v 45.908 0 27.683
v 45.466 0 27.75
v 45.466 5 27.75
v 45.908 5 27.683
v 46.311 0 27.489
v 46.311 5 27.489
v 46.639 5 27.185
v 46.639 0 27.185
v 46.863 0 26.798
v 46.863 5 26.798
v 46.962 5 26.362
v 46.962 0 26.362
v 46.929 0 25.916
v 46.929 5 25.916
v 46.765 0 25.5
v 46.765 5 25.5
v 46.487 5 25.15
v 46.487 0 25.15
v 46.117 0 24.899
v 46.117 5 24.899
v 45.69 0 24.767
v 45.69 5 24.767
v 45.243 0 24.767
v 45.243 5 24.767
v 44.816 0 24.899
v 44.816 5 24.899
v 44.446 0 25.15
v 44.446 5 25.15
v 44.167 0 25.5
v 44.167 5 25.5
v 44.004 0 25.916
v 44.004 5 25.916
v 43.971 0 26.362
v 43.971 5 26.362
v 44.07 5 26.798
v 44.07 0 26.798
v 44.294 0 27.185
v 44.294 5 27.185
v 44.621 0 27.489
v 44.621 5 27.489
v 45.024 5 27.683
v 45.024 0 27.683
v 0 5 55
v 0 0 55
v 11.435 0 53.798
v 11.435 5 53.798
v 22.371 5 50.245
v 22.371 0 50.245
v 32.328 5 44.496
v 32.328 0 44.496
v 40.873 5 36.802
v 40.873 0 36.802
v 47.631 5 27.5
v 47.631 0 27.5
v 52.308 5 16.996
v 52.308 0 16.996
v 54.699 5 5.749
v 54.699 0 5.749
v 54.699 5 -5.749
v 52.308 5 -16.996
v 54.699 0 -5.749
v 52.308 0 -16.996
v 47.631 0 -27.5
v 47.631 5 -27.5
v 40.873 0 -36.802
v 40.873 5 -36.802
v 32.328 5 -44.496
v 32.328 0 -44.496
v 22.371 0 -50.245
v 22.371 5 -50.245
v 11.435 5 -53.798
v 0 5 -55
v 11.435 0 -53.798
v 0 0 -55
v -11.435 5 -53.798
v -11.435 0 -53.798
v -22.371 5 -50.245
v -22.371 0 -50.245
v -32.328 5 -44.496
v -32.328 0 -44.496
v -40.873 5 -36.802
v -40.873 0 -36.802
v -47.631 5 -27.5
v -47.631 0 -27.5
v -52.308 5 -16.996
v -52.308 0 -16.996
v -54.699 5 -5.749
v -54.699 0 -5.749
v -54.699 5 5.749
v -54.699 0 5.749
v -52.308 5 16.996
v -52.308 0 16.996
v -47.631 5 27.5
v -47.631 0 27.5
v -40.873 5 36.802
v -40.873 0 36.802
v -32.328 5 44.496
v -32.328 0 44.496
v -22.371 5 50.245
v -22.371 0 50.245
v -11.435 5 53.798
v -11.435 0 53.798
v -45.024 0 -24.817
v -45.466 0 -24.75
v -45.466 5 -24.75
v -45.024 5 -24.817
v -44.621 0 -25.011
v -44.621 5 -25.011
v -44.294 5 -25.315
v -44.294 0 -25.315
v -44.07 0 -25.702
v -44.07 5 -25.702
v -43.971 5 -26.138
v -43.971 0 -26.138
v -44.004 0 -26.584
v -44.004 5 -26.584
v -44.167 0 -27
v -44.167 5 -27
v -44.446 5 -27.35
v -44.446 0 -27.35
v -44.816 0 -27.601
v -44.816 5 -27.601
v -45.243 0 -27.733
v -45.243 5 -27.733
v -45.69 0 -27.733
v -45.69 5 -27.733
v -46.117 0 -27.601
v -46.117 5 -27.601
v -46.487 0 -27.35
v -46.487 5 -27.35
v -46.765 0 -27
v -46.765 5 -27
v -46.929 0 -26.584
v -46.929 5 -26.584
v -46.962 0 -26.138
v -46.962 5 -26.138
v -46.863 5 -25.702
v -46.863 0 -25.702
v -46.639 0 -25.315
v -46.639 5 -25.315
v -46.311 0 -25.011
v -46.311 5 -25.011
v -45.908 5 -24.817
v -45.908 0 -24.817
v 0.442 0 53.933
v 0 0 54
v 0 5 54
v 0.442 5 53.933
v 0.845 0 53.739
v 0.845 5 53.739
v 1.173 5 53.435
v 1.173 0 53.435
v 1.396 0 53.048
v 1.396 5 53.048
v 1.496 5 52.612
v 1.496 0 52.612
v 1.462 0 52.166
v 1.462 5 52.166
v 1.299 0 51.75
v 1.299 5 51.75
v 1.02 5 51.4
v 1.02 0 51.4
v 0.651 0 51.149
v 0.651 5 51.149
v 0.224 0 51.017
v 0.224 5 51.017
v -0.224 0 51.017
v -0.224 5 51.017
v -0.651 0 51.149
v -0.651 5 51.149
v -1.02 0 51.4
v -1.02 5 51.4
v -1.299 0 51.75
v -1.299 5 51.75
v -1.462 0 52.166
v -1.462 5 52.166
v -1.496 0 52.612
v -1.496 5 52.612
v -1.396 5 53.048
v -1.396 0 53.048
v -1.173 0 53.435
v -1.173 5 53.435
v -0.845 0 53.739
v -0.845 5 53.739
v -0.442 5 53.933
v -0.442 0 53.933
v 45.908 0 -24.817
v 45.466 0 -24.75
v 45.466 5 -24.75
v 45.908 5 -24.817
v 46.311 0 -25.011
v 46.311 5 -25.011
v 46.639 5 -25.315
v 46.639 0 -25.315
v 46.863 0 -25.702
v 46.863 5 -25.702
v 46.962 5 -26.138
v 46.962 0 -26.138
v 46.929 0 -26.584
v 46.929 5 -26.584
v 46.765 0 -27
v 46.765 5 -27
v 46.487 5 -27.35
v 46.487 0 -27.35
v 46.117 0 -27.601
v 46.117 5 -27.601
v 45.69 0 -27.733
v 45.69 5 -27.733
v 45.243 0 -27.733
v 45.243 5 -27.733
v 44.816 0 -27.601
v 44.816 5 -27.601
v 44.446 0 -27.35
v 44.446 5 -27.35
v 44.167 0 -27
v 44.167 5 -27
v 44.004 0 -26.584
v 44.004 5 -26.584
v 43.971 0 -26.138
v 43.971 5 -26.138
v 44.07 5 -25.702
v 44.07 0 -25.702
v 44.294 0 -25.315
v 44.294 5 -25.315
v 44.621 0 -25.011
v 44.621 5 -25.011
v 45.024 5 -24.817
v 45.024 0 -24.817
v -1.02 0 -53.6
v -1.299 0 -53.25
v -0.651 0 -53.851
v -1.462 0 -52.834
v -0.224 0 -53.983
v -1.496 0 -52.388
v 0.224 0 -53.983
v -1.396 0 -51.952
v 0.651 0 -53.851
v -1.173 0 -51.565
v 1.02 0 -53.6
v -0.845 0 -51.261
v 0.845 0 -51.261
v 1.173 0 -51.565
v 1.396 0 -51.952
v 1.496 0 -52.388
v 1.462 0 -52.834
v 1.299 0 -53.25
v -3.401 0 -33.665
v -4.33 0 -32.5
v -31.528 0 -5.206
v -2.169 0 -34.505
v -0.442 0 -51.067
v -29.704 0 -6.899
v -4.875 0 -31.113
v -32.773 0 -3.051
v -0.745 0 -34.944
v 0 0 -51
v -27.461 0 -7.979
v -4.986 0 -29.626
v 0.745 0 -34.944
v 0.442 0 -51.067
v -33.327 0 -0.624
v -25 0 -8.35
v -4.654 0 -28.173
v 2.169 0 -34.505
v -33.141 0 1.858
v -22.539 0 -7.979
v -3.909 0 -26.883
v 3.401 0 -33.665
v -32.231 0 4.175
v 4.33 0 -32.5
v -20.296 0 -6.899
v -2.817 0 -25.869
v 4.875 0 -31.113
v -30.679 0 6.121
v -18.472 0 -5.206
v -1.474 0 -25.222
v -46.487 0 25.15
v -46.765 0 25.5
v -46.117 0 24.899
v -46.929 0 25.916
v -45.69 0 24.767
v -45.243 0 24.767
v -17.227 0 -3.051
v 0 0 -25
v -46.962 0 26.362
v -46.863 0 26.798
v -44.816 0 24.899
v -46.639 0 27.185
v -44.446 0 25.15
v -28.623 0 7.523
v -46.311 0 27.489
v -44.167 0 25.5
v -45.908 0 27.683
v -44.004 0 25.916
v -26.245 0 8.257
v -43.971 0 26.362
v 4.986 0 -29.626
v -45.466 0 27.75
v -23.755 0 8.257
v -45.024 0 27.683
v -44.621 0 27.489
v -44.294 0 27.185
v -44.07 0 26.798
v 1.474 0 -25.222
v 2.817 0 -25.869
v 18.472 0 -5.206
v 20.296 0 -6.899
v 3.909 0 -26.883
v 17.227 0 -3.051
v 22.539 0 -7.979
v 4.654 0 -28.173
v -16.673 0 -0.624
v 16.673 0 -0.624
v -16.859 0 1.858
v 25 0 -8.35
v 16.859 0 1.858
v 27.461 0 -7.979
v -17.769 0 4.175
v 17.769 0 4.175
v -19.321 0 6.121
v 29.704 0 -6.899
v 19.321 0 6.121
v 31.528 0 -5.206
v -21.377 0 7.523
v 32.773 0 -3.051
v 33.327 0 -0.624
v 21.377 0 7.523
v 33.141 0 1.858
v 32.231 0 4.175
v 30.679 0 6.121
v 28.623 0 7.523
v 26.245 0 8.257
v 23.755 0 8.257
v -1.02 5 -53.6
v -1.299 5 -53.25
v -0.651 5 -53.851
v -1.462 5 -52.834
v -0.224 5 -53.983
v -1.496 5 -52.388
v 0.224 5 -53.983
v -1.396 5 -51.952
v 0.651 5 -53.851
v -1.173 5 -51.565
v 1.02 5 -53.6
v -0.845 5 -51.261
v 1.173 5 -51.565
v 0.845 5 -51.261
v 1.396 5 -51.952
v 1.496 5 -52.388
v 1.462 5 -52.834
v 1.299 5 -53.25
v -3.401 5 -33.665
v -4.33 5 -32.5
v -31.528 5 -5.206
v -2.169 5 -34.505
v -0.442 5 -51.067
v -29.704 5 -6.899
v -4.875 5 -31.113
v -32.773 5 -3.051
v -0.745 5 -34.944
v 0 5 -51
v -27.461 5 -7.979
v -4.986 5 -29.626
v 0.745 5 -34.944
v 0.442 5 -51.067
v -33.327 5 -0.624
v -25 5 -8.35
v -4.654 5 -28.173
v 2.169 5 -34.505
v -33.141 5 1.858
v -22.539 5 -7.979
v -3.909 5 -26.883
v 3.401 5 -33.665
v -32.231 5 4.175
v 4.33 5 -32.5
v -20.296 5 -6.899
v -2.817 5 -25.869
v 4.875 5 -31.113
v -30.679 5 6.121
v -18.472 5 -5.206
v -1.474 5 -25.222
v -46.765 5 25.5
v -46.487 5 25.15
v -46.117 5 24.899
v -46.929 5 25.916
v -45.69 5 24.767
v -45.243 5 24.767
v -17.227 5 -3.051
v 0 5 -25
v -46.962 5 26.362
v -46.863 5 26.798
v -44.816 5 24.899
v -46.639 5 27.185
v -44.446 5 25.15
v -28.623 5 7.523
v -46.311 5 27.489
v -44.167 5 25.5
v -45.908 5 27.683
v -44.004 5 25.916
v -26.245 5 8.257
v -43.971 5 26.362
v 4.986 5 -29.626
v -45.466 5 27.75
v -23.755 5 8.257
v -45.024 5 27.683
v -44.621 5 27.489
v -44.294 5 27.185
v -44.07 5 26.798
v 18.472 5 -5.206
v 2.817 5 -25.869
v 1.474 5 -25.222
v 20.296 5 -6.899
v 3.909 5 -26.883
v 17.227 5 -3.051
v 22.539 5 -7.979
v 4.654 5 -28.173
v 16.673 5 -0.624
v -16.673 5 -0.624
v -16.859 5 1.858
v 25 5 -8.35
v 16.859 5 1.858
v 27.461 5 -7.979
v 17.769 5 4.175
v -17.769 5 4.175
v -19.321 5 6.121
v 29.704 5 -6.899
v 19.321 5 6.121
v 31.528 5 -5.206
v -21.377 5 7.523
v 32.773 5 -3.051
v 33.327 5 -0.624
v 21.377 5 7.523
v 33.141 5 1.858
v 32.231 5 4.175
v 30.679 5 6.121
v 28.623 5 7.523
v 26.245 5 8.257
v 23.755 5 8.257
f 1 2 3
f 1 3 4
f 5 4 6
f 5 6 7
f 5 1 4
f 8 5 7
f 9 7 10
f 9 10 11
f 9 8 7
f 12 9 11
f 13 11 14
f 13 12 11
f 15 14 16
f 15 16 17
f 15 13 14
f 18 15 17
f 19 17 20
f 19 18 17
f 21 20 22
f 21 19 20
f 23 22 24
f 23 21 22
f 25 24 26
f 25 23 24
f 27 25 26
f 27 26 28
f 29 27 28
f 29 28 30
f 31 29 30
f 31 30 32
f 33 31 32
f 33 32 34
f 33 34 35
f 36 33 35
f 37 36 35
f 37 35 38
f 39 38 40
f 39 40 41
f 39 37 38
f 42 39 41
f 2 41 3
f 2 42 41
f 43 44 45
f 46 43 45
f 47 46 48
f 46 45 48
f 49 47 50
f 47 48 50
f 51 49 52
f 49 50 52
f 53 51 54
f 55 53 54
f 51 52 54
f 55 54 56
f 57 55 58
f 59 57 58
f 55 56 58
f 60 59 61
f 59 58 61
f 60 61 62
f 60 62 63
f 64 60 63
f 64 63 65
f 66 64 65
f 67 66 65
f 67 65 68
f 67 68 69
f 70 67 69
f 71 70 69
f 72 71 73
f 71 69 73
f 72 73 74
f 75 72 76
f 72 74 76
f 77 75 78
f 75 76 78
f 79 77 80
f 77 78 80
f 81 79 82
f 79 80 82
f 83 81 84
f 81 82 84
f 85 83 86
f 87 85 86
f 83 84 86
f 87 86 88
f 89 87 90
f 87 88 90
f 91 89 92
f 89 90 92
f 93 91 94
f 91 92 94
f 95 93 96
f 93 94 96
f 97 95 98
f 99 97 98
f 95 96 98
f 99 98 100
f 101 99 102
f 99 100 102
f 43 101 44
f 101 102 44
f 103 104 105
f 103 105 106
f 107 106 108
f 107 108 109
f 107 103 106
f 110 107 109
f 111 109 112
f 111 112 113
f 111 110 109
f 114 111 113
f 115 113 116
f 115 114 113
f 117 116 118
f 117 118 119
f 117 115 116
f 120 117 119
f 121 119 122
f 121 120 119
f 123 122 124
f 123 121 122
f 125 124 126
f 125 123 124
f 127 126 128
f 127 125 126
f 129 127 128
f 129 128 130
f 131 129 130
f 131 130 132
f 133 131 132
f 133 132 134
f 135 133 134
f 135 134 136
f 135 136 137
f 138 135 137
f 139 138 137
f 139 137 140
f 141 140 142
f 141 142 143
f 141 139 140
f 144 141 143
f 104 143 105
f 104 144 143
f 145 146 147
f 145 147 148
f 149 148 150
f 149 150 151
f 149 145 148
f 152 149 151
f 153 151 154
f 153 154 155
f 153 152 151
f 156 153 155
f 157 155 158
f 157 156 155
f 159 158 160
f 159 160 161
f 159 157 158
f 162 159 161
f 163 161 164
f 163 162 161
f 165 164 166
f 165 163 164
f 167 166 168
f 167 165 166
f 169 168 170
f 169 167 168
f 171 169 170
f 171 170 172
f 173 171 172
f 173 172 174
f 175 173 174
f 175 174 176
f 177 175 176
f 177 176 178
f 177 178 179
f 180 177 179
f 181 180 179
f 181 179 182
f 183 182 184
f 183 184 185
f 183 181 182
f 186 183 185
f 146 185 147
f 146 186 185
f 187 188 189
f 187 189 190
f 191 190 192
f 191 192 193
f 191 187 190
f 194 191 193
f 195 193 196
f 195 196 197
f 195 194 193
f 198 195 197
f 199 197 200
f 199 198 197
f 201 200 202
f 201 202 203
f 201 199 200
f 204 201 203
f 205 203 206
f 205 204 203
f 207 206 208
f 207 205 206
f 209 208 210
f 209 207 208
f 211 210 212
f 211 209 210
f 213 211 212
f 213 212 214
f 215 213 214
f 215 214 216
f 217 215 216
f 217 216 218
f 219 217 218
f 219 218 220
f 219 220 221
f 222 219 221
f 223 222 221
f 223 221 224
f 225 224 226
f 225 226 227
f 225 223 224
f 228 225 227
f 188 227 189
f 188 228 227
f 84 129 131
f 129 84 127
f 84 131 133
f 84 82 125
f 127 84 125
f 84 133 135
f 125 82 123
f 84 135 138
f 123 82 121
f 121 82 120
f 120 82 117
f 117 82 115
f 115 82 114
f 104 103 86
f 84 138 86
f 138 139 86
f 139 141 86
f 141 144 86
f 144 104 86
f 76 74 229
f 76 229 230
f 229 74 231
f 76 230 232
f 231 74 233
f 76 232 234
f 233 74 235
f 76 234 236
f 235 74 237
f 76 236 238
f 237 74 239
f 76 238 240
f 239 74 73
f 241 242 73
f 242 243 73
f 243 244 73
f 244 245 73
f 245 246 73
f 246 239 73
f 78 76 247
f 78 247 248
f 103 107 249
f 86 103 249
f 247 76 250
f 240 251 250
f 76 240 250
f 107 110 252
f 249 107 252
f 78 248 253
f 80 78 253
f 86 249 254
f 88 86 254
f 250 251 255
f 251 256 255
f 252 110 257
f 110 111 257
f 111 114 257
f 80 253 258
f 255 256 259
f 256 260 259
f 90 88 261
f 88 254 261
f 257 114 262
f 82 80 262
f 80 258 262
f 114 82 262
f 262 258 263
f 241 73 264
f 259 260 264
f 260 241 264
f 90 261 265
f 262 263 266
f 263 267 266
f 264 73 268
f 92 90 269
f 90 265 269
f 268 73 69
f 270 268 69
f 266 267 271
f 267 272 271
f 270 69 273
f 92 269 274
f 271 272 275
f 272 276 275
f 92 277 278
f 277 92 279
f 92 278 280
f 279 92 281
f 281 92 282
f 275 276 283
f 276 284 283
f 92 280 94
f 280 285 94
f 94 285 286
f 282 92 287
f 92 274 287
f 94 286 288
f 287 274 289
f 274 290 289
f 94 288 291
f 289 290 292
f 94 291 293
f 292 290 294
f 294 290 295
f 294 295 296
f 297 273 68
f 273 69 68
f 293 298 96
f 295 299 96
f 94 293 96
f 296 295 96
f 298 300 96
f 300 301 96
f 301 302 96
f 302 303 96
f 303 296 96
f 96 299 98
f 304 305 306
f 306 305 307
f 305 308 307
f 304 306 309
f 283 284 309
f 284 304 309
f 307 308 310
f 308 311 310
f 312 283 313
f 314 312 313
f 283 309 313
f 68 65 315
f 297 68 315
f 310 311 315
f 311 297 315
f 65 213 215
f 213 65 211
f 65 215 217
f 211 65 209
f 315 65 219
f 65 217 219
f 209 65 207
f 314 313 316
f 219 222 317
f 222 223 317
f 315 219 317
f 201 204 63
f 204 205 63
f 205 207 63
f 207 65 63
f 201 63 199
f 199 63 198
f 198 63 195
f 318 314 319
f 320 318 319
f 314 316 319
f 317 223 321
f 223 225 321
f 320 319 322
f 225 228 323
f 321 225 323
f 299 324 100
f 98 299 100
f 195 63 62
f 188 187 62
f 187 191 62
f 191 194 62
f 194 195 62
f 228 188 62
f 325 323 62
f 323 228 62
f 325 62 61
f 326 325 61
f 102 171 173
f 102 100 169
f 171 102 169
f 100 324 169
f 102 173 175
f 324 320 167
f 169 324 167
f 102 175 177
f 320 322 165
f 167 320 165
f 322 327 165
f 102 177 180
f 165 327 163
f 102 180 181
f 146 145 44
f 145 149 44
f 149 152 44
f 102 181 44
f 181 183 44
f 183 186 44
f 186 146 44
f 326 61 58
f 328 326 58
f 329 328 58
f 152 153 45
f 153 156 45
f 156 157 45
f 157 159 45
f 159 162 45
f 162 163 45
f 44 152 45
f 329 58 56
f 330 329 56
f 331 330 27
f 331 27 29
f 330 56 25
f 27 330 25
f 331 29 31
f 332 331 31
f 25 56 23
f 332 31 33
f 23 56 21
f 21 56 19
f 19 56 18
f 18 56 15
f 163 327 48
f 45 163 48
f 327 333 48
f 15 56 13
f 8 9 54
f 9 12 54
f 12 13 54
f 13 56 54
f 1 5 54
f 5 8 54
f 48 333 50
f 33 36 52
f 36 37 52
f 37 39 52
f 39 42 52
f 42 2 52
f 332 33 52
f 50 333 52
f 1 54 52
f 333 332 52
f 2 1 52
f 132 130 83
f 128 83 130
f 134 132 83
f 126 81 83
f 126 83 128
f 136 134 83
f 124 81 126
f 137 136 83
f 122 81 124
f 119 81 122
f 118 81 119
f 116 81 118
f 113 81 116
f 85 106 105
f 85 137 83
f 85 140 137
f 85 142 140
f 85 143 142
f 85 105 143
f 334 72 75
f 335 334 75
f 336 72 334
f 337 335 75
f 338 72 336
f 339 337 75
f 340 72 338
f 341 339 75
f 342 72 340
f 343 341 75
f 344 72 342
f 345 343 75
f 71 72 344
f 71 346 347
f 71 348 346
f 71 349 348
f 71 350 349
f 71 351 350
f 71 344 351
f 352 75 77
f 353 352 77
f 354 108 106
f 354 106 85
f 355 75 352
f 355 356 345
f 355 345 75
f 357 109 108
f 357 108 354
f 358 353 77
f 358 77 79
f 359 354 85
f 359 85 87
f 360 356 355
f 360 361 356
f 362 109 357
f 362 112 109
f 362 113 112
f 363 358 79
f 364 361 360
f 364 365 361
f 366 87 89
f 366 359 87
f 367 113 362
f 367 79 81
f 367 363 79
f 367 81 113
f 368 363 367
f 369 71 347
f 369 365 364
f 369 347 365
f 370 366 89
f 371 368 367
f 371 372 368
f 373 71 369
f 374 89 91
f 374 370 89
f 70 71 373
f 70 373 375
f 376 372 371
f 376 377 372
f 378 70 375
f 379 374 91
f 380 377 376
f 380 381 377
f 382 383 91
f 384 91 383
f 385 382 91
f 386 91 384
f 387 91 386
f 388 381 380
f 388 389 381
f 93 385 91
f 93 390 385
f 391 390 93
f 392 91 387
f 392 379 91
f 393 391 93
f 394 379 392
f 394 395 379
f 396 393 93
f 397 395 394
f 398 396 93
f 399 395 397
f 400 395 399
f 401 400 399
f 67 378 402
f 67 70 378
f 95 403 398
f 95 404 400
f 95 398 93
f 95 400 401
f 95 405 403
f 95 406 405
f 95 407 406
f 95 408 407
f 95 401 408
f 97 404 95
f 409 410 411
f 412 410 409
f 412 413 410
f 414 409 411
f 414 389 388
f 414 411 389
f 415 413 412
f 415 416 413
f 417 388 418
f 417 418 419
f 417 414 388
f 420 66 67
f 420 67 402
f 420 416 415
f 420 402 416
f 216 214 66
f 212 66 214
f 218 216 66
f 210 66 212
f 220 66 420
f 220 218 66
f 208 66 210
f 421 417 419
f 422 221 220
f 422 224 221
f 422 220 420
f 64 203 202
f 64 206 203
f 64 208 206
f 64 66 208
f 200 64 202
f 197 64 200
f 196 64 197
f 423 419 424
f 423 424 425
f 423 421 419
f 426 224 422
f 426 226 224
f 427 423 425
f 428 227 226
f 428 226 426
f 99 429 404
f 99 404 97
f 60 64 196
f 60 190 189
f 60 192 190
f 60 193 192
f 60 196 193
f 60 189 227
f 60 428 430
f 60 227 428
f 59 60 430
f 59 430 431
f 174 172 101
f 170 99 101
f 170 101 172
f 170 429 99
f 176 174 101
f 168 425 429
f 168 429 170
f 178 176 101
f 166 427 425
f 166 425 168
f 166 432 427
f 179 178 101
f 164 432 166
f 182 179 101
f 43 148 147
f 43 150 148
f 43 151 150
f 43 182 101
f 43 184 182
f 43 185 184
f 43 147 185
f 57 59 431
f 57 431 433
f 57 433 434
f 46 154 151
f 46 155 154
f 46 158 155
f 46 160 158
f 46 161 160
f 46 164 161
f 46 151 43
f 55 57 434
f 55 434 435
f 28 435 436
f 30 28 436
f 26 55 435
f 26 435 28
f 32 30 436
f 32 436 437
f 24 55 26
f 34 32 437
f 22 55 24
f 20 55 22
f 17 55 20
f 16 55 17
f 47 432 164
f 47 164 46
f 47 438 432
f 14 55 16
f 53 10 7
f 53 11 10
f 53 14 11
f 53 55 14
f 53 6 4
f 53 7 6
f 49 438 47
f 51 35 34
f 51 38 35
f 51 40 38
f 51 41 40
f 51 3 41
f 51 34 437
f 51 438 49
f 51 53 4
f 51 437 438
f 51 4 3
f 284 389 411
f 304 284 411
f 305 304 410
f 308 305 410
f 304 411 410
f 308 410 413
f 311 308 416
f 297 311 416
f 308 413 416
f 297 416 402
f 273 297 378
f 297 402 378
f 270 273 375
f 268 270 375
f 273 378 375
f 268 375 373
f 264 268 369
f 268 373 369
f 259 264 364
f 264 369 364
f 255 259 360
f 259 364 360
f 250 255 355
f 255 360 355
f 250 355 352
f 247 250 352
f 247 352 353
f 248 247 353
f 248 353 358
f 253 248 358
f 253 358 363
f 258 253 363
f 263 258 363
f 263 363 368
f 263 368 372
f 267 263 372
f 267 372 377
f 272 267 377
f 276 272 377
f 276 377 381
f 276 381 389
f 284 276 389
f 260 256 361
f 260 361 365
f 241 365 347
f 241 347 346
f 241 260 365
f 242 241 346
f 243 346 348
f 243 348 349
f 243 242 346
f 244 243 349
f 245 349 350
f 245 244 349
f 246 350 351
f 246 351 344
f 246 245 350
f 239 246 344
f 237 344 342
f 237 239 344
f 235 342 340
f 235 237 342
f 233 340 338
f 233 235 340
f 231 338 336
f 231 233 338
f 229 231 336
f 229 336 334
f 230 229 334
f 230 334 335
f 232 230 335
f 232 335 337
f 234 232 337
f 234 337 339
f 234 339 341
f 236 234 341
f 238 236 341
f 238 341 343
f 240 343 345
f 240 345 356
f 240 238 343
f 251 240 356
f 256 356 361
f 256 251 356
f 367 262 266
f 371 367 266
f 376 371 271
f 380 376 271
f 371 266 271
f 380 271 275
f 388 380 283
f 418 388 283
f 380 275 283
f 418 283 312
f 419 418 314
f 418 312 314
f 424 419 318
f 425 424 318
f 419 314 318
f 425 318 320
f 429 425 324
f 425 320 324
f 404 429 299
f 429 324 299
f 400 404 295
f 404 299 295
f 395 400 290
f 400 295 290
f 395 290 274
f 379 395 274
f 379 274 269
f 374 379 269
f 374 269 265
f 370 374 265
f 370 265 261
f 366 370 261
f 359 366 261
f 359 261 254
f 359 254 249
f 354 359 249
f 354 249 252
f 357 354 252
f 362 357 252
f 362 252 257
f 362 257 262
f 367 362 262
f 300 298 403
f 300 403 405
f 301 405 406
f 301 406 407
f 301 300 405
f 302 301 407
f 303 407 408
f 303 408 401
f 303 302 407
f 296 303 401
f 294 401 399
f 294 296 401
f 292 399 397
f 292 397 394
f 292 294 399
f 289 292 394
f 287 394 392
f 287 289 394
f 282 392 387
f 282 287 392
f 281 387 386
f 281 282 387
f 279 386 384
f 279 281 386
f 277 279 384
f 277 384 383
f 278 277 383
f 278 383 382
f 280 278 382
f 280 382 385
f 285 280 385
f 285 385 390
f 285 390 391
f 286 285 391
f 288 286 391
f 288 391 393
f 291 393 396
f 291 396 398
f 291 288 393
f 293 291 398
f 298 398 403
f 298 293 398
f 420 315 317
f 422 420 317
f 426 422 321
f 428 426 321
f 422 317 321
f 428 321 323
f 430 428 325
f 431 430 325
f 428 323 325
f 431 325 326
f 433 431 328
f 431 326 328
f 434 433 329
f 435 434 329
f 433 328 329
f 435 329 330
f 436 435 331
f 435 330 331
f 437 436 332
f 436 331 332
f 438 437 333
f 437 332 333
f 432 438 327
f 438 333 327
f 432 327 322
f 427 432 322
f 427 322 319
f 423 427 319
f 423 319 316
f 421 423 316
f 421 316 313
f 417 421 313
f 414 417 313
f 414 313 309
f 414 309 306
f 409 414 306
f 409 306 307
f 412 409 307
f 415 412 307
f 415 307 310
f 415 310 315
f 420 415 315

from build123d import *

# Parameters (mm, degrees)
SKETCH_1_R          = 55
SKETCH_1_R_2        = 1.5
EXTRUDE_1_DEPTH     = 5
SKETCH_4_R          = 5
CUT_EXTRUDE_1_DEPTH = 10
SKETCH_5_R          = 8.35
CUT_EXTRUDE_2_DEPTH = 78.942286341


with BuildPart() as part:
    # 草图1 → 凸台-拉伸1 (new body)
    with BuildSketch(Plane(origin=(0, 0, 0), x_dir=(1, 0, 0), z_dir=(0, 1, 0))):
        with Locations(Location((0, 0, 0), (0, 0, 270))):
            Circle(SKETCH_1_R)
        with Locations(Location((0, 52.5, 0), (0, 0, 270))):
            Circle(SKETCH_1_R_2, mode=Mode.SUBTRACT)
        with Locations(Location((45.466333699, 26.25, 0), (0, 0, 270))):
            Circle(SKETCH_1_R_2, mode=Mode.SUBTRACT)
        with Locations(Location((45.466333699, -26.25, 0), (0, 0, 270))):
            Circle(SKETCH_1_R_2, mode=Mode.SUBTRACT)
        with Locations(Location((0, -52.5, 0), (0, 0, 270))):
            Circle(SKETCH_1_R_2, mode=Mode.SUBTRACT)
        with Locations(Location((-45.466333699, -26.25, 0), (0, 0, 270))):
            Circle(SKETCH_1_R_2, mode=Mode.SUBTRACT)
        with Locations(Location((-45.466333699, 26.25, 0), (0, 0, 270))):
            Circle(SKETCH_1_R_2, mode=Mode.SUBTRACT)
    extrude(amount=EXTRUDE_1_DEPTH)

    # 草图4 → 切除-拉伸1 (cut)
    with BuildSketch(Plane(origin=(0, 5, 0), x_dir=(1, 0, 0), z_dir=(0, 1, 0))):
        with Locations(Location((0, 30, 0), (0, 0, 270))):
            Circle(SKETCH_4_R)
    extrude(amount=-CUT_EXTRUDE_1_DEPTH, mode=Mode.SUBTRACT)

    # 草图5 → 切除-拉伸2 (cut, through all)
    with BuildSketch(Plane.XZ):
        with Locations(Location((-25, 0, 0), (0, 0, 270))):
            Circle(SKETCH_5_R)
        with Locations(Location((25, 0, 0), (0, 0, 270))):
            Circle(SKETCH_5_R)
    extrude(amount=-CUT_EXTRUDE_2_DEPTH, mode=Mode.SUBTRACT)


solid = part.part
